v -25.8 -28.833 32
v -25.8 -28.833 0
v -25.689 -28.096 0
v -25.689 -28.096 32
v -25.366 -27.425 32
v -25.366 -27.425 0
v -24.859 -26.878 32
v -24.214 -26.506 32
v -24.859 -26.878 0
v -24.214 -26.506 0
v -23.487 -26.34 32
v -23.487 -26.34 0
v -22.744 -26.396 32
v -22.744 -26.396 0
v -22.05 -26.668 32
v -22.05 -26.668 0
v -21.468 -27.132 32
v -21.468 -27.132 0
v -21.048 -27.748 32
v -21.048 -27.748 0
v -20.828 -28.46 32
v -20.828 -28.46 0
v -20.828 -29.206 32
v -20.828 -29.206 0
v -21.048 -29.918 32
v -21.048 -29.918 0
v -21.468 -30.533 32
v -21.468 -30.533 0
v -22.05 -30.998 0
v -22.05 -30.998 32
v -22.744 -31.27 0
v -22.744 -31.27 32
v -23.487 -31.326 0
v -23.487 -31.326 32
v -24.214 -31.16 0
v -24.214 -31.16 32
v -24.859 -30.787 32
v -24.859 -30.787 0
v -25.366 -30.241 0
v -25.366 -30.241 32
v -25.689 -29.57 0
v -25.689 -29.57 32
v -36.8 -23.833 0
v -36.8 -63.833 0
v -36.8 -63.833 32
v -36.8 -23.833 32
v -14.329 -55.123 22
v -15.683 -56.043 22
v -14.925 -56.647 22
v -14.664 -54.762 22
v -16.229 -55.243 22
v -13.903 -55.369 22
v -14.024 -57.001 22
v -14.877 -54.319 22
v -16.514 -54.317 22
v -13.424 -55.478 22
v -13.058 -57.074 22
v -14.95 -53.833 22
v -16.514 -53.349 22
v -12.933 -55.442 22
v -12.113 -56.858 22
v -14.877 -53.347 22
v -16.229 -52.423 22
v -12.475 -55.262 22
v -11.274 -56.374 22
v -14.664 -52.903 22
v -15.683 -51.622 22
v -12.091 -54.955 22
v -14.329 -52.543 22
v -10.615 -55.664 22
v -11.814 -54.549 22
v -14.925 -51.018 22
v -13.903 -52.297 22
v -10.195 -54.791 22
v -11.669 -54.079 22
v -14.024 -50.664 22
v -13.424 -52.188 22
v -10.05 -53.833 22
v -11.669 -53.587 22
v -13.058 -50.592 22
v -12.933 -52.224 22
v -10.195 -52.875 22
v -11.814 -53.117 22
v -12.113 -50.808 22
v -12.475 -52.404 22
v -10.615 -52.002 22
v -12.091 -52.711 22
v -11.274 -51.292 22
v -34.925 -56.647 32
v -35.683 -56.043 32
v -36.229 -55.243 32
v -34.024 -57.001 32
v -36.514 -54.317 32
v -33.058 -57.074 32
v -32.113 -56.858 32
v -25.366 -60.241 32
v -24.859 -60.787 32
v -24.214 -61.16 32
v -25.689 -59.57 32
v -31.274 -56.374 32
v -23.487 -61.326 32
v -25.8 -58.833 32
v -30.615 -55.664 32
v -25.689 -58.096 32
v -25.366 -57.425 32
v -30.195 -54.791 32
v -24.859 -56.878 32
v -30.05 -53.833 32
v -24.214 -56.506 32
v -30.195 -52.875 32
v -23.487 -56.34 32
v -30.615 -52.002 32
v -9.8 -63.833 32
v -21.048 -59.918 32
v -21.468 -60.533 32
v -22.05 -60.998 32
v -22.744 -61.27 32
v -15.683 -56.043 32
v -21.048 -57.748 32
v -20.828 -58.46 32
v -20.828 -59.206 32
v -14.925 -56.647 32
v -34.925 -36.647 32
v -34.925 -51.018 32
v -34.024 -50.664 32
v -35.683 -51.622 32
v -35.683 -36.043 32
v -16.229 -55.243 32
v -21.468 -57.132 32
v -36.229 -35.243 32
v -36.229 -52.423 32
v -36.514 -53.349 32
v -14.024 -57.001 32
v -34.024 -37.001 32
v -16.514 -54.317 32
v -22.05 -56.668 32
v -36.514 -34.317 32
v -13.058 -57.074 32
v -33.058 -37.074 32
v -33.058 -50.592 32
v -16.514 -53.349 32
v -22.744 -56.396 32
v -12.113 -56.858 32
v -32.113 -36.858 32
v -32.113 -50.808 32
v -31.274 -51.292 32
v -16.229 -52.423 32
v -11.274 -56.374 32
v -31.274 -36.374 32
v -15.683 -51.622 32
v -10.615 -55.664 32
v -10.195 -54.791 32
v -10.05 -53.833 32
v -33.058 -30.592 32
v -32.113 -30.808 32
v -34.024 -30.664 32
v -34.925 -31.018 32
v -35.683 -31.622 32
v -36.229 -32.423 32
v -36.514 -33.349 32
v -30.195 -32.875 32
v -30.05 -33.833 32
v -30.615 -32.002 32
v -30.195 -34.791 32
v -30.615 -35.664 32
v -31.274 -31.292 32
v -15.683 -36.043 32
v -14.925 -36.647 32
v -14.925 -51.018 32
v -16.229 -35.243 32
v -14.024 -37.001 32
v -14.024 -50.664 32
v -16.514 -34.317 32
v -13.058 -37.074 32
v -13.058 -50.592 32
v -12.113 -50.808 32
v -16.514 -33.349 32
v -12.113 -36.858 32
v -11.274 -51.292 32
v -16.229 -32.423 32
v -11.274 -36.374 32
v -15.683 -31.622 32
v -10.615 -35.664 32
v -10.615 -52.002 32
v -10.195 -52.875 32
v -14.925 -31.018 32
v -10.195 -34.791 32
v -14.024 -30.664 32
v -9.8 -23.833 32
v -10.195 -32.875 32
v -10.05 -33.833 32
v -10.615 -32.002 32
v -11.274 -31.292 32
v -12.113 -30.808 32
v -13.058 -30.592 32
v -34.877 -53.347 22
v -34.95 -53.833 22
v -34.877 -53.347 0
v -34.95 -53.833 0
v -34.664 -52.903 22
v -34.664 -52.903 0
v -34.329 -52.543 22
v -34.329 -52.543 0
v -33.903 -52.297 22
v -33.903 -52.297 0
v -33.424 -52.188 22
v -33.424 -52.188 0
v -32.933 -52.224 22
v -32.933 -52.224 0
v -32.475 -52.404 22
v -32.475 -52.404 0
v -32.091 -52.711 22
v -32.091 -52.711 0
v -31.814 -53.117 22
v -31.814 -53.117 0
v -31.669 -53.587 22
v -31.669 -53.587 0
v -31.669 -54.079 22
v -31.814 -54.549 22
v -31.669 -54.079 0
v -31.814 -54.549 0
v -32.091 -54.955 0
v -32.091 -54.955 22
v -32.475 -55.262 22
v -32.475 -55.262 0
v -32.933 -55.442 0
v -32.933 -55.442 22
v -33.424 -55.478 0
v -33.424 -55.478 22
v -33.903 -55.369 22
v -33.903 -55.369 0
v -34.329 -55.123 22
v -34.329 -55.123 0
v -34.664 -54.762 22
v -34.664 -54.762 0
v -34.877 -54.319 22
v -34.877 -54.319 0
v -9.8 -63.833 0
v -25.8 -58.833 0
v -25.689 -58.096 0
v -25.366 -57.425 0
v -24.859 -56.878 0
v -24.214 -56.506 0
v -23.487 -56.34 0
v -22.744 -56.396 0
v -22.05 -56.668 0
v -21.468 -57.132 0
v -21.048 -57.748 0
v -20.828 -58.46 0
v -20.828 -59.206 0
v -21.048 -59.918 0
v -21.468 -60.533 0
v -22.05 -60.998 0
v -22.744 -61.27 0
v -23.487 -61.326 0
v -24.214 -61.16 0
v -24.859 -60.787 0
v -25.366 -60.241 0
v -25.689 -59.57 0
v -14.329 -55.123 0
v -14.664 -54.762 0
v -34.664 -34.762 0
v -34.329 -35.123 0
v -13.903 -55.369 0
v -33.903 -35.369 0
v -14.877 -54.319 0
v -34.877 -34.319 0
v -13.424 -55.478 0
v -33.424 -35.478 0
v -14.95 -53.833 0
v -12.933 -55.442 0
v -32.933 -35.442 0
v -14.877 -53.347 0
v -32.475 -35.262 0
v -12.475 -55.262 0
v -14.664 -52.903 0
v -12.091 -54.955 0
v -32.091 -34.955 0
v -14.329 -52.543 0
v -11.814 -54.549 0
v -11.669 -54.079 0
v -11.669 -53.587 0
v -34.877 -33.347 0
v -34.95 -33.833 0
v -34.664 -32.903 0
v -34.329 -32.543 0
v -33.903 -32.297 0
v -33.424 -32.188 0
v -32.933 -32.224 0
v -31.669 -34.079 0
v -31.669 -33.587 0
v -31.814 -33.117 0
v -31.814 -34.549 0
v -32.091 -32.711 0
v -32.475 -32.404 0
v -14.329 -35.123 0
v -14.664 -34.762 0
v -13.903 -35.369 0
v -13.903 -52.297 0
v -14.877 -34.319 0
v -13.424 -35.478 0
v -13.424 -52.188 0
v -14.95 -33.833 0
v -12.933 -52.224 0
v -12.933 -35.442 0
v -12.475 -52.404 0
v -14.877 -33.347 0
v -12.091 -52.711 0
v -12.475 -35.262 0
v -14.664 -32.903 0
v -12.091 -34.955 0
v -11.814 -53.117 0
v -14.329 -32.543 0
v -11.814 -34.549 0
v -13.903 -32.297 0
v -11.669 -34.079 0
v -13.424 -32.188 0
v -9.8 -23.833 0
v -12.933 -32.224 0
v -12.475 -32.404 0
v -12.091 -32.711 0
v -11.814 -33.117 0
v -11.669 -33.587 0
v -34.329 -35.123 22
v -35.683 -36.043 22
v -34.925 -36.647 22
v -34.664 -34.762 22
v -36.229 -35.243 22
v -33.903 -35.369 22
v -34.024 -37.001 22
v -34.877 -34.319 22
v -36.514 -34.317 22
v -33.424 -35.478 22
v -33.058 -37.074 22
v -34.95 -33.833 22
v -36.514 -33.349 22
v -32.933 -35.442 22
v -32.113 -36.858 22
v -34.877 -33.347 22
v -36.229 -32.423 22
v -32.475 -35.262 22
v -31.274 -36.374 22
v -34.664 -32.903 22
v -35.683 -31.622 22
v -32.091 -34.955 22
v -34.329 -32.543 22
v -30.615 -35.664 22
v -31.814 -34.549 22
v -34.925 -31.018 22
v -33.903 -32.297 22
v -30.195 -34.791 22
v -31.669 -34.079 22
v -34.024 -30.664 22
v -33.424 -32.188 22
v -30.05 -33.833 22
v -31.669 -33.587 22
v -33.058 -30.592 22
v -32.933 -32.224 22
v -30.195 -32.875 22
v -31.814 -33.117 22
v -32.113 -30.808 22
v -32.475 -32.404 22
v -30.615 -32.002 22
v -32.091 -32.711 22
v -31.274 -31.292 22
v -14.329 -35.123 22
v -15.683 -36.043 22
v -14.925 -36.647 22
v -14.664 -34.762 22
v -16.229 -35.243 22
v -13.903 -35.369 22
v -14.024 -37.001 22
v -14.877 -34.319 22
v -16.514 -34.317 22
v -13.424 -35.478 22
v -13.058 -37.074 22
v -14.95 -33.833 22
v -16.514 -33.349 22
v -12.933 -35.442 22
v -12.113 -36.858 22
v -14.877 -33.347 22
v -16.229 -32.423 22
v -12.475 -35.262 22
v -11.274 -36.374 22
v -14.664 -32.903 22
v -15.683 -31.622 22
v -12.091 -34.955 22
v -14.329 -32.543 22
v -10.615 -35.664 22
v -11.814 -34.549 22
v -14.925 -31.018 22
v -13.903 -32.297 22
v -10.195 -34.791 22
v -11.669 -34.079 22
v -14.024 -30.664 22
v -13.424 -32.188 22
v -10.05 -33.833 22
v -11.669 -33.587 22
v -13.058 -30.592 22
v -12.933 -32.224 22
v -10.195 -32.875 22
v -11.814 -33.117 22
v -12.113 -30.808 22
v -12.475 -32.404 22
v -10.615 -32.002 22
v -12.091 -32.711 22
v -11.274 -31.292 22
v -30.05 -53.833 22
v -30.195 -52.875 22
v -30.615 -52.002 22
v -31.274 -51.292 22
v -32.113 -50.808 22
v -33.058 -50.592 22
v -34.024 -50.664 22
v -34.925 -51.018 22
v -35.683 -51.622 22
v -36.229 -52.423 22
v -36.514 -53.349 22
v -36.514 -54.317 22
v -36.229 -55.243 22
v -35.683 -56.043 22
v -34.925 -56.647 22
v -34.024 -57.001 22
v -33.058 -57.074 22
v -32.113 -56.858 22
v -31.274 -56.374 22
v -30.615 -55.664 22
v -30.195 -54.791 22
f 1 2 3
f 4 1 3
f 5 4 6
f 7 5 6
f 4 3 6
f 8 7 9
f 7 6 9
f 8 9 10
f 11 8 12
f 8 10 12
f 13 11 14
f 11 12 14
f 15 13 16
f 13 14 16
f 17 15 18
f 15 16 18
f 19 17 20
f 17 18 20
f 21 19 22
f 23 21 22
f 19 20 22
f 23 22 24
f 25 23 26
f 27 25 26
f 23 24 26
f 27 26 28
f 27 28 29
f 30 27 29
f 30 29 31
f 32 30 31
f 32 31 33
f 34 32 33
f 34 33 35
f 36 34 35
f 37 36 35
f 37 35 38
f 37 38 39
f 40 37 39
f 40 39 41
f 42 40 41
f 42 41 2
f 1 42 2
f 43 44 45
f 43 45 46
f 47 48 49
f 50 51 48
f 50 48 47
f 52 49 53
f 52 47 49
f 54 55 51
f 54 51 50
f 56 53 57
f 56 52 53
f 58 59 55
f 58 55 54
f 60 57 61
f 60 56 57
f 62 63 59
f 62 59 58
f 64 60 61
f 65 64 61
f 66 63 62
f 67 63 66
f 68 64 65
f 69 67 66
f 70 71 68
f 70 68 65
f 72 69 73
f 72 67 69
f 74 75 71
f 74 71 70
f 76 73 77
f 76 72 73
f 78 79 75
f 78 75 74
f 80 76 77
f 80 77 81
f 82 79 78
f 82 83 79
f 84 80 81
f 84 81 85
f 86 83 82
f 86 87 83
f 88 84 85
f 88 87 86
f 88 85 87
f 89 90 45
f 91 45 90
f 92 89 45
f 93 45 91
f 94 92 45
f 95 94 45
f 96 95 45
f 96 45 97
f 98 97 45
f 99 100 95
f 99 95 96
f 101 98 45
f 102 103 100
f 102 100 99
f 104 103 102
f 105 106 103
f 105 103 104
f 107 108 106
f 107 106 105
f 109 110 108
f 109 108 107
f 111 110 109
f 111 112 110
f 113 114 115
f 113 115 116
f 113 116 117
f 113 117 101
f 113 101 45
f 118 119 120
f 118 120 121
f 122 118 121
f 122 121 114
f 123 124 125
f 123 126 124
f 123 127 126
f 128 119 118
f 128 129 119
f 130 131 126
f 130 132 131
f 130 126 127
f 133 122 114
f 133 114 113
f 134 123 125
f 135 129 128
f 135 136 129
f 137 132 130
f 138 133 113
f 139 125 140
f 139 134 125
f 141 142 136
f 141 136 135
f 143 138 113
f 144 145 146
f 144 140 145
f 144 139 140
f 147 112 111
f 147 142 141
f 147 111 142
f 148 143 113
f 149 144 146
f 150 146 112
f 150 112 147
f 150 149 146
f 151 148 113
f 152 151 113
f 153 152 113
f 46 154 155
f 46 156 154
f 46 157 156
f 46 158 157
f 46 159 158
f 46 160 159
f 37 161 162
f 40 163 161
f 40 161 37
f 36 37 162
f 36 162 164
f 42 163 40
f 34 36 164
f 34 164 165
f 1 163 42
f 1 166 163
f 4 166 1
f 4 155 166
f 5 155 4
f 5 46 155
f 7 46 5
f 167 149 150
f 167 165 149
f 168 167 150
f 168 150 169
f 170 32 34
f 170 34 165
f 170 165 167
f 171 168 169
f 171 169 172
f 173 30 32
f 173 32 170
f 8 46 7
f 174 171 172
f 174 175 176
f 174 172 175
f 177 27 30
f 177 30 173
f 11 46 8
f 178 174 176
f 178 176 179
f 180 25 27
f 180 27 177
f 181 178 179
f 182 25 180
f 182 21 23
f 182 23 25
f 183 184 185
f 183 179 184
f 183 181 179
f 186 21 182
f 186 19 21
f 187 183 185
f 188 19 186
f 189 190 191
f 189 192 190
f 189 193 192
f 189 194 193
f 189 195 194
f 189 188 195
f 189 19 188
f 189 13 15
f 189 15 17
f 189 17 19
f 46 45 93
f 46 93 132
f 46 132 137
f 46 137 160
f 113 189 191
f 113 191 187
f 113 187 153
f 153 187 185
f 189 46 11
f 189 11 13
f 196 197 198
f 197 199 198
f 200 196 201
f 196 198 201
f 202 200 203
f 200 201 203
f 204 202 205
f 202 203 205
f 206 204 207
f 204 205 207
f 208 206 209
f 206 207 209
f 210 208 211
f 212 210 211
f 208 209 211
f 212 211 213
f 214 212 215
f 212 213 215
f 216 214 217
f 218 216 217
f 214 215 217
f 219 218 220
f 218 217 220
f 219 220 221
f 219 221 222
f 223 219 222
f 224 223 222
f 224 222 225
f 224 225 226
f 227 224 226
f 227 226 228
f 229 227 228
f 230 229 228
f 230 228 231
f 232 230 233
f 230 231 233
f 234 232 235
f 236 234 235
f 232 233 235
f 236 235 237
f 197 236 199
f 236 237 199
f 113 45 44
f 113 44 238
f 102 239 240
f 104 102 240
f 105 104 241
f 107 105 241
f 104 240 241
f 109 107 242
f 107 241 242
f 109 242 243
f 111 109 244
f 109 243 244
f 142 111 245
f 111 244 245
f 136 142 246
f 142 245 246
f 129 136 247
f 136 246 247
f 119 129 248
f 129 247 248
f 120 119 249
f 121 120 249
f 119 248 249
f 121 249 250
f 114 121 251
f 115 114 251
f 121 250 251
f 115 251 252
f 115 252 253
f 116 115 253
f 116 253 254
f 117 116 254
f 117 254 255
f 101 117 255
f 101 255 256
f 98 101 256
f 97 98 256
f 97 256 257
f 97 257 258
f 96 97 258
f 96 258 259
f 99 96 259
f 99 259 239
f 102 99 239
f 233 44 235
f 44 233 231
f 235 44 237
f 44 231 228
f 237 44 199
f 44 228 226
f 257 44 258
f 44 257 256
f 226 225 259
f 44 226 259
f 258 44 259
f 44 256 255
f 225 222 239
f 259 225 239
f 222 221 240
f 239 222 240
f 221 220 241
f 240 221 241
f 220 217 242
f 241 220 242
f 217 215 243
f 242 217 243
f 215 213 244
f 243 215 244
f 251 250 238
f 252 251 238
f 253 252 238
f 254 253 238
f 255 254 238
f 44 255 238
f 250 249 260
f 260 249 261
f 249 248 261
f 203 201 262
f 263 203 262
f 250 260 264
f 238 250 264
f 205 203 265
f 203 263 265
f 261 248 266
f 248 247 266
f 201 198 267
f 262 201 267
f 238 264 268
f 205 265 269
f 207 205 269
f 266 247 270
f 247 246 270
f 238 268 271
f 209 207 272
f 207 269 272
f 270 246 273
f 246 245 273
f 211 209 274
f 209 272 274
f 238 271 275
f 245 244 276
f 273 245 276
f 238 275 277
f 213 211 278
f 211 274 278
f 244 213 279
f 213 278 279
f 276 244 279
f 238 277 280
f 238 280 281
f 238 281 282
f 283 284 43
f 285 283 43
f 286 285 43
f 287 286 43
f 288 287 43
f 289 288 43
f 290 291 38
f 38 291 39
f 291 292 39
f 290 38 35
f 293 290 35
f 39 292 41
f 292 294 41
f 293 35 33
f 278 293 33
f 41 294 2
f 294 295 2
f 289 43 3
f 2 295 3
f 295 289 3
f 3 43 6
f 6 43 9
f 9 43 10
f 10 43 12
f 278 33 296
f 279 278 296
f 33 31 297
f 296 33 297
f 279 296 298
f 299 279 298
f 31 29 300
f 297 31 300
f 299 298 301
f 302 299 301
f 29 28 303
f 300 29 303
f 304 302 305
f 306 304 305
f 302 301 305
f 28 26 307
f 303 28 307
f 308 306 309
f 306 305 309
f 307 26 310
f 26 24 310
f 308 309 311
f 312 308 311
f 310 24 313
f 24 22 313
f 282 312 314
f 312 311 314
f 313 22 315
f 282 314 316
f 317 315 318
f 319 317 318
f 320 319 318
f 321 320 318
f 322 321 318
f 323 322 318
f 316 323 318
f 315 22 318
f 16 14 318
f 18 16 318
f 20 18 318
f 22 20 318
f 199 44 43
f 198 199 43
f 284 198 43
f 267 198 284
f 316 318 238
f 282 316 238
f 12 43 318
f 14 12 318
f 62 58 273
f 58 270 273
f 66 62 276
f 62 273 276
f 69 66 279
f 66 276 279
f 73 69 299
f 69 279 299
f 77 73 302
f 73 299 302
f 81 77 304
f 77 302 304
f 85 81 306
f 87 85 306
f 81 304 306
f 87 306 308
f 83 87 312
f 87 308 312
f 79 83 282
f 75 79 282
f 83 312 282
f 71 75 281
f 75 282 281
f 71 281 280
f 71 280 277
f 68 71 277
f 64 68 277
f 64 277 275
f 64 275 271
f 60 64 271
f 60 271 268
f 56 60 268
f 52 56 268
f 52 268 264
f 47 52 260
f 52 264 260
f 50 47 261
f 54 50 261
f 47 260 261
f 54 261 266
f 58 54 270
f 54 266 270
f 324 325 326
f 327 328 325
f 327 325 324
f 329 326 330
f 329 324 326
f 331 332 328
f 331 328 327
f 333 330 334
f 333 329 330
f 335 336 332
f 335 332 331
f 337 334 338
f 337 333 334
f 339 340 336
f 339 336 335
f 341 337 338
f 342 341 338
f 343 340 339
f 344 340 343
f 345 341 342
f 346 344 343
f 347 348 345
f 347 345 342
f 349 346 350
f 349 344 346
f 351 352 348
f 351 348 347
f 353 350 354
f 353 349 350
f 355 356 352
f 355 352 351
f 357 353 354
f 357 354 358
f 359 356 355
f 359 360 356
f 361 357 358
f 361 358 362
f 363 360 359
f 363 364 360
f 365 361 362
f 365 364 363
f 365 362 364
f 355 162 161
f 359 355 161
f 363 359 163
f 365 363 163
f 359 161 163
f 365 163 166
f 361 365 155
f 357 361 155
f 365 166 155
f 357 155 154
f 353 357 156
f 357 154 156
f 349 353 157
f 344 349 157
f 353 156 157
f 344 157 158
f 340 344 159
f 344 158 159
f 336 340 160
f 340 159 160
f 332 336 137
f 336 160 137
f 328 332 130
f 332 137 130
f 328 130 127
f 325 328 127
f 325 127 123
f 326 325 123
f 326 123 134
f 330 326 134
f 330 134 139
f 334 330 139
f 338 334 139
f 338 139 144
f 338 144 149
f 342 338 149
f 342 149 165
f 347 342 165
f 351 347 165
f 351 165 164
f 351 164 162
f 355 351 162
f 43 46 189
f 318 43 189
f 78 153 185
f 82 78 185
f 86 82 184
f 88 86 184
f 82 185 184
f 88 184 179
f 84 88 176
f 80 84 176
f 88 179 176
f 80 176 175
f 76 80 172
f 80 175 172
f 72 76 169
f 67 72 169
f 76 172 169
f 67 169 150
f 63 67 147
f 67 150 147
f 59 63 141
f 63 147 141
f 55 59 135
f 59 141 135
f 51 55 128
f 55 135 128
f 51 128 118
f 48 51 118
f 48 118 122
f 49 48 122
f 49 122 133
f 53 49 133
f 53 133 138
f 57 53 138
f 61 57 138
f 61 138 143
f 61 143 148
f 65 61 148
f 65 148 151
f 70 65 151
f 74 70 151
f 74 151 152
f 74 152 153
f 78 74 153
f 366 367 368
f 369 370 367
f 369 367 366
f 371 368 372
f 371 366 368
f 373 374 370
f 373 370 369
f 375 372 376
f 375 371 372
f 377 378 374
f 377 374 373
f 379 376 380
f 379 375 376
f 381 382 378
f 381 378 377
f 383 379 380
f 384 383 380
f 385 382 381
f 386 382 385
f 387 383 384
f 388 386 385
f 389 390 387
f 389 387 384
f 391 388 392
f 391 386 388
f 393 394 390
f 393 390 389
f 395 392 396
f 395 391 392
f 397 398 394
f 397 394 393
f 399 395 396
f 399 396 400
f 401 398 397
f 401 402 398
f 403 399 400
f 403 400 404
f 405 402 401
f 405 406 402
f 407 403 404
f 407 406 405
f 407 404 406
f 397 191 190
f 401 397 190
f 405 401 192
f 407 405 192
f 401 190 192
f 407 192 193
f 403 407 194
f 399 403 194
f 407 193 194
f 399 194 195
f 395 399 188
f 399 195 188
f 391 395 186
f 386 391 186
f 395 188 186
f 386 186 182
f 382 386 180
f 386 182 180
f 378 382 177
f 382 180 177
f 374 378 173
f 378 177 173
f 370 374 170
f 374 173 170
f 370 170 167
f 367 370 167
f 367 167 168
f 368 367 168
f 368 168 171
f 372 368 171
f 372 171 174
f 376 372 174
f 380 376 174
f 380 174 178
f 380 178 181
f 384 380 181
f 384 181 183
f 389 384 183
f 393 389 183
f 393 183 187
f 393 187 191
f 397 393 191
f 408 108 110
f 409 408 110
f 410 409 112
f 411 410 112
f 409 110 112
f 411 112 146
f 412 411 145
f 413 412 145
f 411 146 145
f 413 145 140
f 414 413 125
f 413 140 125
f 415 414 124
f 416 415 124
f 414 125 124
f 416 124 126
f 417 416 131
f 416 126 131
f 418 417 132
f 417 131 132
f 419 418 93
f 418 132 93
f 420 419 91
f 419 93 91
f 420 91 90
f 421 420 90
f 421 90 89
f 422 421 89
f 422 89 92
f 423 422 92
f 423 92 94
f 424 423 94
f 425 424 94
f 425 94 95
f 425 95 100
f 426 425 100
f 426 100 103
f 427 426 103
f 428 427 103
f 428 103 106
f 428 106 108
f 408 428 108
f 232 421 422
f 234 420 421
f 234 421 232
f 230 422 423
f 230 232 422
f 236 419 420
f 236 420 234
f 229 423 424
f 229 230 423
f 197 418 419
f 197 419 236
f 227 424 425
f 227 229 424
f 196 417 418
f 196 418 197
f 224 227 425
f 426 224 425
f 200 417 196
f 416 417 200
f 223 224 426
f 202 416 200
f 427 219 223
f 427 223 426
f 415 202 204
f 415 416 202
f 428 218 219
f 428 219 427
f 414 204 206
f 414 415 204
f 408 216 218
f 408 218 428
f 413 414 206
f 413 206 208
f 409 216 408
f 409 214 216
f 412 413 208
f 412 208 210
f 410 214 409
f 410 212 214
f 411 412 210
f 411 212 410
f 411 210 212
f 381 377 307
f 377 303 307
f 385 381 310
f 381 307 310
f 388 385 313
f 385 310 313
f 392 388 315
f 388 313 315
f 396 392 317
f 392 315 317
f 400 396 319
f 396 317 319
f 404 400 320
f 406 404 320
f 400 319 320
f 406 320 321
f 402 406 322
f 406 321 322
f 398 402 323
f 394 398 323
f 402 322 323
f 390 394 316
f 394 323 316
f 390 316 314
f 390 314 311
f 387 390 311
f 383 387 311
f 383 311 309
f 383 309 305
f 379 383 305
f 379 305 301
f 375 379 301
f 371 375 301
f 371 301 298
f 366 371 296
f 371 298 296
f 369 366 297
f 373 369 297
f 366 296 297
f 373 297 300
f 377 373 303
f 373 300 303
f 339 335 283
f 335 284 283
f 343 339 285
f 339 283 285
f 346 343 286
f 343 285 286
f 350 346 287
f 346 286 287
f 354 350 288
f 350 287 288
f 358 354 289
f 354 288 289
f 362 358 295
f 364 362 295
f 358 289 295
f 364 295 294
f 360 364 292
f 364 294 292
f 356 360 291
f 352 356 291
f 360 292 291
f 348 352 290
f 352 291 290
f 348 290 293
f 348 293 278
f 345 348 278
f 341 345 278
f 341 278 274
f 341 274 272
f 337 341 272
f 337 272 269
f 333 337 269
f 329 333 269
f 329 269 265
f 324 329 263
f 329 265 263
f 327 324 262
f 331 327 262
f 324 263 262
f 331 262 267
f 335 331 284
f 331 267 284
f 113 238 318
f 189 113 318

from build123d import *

# Parameters (mm, degrees)
F0_W           = 27
F0_H           = 40
F1_DEPTH       = 32
F3_D           = 3.3
F3_CBORE_D     = 6.5
F3_CBORE_DEPTH = 10
F4_D           = 5


with BuildPart() as f1:
    # F0 (on Top) → F1 (new body)
    with BuildSketch(Plane.XY):
        with Locations((-23.3004702032, -43.8329163194)):
            Rectangle(F0_W, F0_H)
    extrude(amount=F1_DEPTH)

    # F3 (through all)
    with Locations(Plane.XY.offset(32)):
        with Locations((-33.3004702032, -33.8329163194), (-13.3004702032, -33.8329163194), (-13.3004702032, -53.8329163194), (-33.3004702032, -53.8329163194)):
            CounterBoreHole(F3_D / 2, F3_CBORE_D / 2, F3_CBORE_DEPTH)

    # F4 (through all)
    with Locations(Plane.XY.offset(32)):
        with Locations((-23.3004702032, -28.8329163194), (-23.3004702032, -58.8329163194)):
            Hole(F4_D / 2)


solid = f1.part
